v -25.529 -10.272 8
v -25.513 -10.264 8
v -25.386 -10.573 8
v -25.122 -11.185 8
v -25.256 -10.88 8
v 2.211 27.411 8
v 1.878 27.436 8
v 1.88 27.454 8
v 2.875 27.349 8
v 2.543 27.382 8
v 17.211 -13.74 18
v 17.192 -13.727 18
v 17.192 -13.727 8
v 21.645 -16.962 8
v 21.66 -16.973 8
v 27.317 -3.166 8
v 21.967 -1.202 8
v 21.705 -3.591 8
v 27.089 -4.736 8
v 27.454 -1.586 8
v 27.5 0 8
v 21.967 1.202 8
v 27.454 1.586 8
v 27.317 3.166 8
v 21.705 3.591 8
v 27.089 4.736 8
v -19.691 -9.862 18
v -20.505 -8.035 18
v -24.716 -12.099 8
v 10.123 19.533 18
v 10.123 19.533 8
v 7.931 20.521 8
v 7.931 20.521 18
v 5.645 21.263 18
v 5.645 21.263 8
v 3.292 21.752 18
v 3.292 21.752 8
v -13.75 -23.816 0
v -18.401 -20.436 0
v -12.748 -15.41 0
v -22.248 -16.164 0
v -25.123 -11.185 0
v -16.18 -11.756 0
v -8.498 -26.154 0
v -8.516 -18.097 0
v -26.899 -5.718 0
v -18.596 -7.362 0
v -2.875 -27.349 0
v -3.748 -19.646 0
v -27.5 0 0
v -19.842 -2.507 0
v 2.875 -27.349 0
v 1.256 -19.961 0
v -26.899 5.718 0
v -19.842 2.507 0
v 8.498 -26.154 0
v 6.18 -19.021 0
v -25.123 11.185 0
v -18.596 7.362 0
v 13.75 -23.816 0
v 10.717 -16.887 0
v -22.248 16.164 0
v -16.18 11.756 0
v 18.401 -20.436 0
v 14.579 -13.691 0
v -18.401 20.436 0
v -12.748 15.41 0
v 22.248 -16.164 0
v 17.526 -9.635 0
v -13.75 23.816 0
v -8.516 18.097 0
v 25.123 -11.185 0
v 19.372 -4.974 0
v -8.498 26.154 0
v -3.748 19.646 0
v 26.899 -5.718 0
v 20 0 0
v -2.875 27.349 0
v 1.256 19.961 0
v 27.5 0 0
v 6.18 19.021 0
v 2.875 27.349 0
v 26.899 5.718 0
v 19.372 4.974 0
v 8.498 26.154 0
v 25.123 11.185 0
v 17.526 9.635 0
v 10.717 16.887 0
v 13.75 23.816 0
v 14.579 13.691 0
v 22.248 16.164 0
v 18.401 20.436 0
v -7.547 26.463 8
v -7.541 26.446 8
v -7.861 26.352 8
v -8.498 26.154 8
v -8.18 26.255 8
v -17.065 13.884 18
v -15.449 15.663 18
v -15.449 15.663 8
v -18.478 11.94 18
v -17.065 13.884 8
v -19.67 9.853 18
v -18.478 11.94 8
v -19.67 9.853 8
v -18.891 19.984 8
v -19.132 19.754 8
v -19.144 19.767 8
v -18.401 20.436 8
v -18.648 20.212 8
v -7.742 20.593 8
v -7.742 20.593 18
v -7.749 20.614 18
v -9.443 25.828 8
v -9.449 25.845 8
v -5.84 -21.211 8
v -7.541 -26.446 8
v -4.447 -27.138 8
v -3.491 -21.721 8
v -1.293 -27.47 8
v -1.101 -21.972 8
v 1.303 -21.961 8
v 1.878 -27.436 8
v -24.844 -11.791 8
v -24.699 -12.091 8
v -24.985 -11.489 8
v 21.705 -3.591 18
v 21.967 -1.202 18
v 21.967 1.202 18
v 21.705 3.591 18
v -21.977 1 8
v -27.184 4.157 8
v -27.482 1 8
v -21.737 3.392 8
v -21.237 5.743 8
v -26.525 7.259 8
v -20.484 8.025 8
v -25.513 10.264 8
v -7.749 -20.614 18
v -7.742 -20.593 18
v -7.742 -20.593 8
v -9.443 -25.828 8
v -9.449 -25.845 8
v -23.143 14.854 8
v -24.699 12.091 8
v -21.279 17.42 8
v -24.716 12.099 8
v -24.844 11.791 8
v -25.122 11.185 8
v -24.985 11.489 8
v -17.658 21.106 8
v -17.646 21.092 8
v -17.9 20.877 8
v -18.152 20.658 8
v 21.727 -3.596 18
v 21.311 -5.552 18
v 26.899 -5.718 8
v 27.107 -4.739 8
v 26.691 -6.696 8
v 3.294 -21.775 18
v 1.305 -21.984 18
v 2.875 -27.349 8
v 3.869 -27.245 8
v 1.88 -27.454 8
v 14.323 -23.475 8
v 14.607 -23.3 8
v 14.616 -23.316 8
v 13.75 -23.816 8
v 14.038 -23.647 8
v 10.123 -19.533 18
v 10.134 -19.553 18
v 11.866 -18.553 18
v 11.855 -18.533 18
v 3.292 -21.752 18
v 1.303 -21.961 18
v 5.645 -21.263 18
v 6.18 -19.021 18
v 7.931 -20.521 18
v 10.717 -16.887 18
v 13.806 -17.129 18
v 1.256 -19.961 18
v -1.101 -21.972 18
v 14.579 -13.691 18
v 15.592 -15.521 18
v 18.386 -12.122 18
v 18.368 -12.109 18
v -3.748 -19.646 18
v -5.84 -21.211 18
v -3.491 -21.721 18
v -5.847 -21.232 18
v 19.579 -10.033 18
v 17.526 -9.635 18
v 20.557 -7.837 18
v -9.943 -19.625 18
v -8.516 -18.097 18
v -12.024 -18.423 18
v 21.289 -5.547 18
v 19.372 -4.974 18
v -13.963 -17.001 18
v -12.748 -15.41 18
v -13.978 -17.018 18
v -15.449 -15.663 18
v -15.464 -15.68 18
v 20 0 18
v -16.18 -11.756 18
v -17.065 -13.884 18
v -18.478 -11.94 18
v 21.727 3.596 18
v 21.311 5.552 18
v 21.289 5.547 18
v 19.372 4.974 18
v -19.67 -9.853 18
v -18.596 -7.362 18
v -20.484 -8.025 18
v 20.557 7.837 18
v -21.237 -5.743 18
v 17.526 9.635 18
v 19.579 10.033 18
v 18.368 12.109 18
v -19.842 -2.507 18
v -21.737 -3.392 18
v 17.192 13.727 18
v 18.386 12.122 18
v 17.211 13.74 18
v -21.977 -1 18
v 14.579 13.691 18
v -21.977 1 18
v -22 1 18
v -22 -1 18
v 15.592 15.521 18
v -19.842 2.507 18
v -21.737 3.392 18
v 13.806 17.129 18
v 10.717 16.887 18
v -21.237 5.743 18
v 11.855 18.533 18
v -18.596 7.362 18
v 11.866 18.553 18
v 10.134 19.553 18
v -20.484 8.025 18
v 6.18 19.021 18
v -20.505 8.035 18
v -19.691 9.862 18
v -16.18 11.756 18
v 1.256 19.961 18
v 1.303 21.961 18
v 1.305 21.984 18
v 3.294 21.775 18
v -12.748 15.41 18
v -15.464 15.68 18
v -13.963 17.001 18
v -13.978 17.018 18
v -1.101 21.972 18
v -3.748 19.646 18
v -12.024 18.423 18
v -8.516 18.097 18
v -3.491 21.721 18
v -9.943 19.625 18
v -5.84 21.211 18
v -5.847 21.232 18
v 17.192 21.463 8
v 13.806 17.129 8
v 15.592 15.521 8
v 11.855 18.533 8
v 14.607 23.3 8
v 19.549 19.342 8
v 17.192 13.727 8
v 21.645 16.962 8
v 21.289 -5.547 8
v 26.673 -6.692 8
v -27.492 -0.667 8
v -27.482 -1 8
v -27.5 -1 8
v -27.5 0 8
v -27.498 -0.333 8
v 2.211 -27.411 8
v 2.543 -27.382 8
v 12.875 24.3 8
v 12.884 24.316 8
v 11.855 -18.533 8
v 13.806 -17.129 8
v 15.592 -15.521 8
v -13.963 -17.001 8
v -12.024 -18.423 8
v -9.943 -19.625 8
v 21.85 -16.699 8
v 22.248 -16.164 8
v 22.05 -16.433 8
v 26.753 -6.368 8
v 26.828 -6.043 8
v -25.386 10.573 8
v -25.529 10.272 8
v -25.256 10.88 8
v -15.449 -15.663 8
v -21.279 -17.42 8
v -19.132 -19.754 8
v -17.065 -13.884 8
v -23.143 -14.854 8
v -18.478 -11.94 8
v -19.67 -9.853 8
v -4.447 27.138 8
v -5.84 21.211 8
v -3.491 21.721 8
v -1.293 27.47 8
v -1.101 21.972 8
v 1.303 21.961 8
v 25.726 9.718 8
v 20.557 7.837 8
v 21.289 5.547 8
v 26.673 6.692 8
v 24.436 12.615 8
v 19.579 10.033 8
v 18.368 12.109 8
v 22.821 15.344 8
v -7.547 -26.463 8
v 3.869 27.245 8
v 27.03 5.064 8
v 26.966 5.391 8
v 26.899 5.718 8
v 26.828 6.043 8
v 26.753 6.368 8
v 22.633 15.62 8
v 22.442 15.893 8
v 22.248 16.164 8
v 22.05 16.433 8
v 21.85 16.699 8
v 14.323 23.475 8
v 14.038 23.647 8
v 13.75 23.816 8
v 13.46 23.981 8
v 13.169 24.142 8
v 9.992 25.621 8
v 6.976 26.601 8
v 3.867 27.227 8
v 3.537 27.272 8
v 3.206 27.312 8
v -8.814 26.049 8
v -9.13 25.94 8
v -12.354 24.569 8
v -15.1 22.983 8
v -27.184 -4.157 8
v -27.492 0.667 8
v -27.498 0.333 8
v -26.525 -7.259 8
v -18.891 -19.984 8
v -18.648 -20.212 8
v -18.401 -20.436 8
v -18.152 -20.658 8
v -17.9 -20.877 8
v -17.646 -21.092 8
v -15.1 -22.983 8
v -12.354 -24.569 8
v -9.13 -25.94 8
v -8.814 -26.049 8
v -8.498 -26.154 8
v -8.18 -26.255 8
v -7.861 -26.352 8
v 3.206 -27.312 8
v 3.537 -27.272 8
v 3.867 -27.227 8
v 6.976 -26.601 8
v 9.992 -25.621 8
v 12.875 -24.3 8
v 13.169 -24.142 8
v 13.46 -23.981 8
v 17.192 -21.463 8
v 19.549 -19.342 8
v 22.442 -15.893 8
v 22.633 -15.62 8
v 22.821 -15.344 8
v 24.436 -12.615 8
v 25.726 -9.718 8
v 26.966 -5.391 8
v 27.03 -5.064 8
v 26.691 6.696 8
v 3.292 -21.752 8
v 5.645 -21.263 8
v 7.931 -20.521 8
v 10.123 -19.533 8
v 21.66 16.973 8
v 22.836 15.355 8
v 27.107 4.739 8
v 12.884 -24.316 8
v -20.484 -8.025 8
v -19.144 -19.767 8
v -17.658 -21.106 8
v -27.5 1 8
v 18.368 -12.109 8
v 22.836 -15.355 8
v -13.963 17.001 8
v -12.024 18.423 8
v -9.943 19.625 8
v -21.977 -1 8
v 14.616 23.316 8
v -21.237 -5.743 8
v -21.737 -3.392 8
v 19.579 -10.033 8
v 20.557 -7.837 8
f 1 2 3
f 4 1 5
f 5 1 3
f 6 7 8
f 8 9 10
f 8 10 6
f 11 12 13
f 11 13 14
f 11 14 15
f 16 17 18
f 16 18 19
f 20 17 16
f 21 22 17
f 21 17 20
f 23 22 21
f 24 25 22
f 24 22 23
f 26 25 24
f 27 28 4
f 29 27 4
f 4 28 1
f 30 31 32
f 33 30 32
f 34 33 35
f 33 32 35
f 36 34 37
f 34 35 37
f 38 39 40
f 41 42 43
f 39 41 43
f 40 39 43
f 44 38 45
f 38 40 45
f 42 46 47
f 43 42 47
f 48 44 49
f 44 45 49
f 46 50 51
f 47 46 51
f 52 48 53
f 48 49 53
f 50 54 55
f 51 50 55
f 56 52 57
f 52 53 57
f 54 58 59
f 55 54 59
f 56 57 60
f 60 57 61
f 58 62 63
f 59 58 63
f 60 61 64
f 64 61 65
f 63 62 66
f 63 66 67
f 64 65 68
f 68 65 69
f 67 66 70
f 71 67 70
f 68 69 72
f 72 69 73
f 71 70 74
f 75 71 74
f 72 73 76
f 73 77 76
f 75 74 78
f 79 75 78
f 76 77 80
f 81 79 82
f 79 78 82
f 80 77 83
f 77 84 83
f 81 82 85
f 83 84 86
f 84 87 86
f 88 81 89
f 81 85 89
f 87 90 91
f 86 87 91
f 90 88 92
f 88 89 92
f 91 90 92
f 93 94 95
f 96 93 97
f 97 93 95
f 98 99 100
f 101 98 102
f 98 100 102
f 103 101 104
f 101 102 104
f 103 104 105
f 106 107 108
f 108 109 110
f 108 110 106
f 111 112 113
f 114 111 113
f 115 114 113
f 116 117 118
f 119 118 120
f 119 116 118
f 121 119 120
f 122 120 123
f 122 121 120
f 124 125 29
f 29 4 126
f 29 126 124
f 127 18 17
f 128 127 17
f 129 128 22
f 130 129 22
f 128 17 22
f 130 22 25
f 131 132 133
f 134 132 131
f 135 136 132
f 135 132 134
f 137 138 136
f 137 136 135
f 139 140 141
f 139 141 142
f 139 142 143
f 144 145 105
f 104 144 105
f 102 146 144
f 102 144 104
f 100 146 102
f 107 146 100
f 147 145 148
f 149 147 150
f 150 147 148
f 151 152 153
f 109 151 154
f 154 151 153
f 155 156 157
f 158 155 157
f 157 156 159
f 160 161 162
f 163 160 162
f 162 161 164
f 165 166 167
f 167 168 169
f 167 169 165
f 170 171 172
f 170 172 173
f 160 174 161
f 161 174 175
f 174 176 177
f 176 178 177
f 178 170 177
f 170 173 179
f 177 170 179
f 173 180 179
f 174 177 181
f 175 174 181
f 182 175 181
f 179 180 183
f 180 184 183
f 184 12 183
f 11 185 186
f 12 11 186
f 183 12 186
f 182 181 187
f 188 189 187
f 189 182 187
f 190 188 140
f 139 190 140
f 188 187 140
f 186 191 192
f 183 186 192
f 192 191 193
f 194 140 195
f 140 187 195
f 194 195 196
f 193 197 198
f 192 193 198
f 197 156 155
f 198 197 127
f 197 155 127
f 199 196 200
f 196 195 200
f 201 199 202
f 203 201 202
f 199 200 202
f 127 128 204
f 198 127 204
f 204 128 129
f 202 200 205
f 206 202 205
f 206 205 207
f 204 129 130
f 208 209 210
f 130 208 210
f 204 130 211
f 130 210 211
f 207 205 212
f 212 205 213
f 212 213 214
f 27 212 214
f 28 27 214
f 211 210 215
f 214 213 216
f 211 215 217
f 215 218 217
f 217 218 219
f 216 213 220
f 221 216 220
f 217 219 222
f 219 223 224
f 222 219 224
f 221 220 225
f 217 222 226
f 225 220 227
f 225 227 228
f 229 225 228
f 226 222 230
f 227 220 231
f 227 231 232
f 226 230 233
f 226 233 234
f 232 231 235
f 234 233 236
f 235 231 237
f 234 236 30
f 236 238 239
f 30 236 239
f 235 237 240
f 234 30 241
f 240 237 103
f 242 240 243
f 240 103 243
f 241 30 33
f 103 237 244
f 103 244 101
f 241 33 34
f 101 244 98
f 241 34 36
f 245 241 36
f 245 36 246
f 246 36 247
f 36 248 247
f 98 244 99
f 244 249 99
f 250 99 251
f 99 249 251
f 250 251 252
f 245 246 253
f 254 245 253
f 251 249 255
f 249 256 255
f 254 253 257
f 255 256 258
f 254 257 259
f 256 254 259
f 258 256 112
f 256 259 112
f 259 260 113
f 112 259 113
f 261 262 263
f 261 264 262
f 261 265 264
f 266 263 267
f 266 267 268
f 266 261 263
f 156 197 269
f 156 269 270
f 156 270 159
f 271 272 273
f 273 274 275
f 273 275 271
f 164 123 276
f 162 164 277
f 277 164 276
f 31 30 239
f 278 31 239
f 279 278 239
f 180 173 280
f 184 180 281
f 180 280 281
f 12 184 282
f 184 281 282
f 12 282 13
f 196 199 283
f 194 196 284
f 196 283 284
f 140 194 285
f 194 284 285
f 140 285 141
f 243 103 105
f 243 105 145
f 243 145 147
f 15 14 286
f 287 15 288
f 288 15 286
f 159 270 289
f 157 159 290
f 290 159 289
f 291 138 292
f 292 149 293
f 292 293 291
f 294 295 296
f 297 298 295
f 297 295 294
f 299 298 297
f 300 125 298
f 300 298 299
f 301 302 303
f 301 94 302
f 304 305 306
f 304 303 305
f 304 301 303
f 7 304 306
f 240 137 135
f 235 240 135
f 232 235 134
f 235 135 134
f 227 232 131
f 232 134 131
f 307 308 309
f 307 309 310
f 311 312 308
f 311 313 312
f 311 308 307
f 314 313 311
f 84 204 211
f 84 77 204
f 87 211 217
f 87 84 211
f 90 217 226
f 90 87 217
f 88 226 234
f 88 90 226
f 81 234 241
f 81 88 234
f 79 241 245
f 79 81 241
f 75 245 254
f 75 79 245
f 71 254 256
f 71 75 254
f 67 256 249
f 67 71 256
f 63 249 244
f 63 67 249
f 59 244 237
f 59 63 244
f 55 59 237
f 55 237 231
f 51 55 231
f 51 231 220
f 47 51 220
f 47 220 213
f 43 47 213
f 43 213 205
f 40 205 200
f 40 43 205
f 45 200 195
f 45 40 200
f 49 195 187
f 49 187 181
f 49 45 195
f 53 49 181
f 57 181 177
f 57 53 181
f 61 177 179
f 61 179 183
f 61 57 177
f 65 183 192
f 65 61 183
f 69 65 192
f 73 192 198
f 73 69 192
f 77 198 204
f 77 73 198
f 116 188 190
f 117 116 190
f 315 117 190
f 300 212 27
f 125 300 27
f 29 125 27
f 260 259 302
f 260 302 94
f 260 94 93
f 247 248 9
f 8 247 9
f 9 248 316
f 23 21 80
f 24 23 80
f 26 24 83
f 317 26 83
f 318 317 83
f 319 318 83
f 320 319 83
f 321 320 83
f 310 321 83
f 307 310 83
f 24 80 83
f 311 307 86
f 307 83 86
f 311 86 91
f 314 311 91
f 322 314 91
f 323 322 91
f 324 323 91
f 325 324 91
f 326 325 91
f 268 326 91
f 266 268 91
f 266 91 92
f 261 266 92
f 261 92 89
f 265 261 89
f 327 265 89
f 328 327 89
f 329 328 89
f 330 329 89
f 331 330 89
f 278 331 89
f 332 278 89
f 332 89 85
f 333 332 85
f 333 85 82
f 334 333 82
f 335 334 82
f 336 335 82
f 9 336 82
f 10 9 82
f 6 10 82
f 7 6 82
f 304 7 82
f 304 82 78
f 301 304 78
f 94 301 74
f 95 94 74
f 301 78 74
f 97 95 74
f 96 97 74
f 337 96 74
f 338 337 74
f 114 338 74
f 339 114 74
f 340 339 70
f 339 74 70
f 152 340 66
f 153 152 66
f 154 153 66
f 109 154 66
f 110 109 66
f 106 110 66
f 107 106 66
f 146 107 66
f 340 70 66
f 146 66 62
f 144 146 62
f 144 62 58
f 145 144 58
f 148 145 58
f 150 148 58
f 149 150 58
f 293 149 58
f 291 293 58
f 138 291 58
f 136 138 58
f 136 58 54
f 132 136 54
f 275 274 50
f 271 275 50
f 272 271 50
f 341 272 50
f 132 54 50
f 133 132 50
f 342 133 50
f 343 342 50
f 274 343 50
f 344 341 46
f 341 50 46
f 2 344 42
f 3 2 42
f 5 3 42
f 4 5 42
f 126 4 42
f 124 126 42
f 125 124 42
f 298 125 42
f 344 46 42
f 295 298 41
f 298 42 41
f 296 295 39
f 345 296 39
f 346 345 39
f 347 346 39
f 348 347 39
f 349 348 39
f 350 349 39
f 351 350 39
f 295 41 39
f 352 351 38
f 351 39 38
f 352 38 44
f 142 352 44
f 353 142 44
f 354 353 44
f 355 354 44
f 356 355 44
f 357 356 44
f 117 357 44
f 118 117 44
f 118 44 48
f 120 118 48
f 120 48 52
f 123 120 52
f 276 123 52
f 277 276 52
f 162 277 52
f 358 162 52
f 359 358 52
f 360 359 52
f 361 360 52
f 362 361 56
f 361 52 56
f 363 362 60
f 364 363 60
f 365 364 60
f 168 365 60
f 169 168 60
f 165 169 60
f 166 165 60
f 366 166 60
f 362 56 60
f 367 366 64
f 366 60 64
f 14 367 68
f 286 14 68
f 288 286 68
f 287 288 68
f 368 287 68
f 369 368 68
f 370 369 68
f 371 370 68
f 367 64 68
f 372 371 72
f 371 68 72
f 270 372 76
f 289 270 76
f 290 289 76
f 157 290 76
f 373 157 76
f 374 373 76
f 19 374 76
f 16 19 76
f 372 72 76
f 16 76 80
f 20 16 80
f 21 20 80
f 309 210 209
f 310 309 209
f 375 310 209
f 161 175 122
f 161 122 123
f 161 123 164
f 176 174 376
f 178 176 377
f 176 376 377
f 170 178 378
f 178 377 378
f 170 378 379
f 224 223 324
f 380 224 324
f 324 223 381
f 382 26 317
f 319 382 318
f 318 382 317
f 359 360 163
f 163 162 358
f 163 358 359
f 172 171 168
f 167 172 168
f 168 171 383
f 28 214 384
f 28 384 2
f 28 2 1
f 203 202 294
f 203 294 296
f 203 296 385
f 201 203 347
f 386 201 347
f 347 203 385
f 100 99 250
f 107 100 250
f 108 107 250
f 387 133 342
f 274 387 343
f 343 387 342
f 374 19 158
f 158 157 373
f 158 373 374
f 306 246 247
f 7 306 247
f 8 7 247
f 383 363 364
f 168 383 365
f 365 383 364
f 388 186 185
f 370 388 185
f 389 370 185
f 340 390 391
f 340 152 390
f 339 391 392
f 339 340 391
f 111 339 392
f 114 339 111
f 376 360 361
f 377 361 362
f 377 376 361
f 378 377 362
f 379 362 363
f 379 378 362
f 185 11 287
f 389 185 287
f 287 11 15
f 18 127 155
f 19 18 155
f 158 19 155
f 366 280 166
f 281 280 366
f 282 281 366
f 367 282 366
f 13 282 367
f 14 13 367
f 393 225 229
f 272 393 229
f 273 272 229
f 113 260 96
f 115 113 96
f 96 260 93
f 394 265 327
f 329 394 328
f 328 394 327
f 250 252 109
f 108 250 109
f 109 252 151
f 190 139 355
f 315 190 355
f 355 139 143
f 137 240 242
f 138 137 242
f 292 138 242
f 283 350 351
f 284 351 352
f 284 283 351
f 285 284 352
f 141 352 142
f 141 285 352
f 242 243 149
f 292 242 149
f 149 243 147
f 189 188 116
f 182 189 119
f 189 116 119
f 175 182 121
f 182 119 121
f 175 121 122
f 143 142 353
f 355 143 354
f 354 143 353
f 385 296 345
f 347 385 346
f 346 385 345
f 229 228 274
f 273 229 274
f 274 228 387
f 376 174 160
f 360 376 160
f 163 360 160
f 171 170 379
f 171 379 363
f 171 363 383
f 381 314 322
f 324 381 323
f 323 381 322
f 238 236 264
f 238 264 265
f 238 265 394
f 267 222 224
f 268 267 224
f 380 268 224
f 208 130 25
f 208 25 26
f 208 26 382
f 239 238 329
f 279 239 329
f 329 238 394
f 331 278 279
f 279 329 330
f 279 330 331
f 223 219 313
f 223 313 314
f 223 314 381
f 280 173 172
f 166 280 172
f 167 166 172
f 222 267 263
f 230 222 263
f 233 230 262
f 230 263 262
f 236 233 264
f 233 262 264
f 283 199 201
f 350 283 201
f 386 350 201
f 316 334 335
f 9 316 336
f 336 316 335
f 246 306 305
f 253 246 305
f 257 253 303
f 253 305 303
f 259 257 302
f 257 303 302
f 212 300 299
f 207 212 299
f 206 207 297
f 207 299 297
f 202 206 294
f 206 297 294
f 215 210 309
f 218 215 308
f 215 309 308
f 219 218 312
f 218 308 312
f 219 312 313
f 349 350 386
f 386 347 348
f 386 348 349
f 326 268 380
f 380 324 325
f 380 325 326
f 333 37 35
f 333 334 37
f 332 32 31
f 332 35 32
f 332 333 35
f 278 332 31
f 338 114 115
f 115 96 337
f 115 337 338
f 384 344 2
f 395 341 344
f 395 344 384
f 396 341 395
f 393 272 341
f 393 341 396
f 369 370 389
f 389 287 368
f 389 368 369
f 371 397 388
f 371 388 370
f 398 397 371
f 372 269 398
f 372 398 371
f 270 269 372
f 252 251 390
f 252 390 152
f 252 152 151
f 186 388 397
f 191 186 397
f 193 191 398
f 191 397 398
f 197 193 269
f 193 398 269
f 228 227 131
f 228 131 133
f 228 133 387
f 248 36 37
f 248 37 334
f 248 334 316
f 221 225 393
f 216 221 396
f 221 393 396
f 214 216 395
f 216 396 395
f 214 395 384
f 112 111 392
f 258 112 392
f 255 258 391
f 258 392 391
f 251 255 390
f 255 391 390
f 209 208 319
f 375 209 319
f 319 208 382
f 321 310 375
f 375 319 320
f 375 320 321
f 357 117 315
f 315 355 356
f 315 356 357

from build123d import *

# Parameters (mm, degrees)
SKETCH1_R           = 27.5
SKETCH1_R_2         = 20
BOSS_EXTRUDE1_DEPTH = 8
SKETCH2_R           = 22
SKETCH2_R_2         = 20
BOSS_EXTRUDE2_DEPTH = 10
BOSS_EXTRUDE3_DEPTH = 1
CIRPATTERN1_COUNT   = 15


with BuildPart() as part:
    # Sketch1 → Boss-Extrude1 (new body)
    with BuildSketch(Plane.XY):
        Circle(SKETCH1_R)
        Circle(SKETCH1_R_2, mode=Mode.SUBTRACT)
    extrude(amount=BOSS_EXTRUDE1_DEPTH)

    # Sketch2 → Boss-Extrude2 (add)
    with BuildSketch(Plane.XY.offset(8)):
        Circle(SKETCH2_R)
        Circle(SKETCH2_R_2, mode=Mode.SUBTRACT)
    extrude(amount=BOSS_EXTRUDE2_DEPTH)

    # Sketch3 → Boss-Extrude3 (add, symmetric)
    with BuildSketch(Plane(origin=(0, 0, 0), x_dir=(1, 0, 0), z_dir=(0, 1, 0))):
        Polygon((-22, -18), (-27.5, -8), (-22, -8), (-20.5, -8), (-20.5, -18), align=None)
    boss_extrude3 = extrude(amount=BOSS_EXTRUDE3_DEPTH, both=True)

    # CirPattern1: Boss-Extrude3 ×15 about axis
    cirpattern1_axis = Axis((0, 0, 0), (0, 0, 1))
    for i in range(1, CIRPATTERN1_COUNT):
        add(boss_extrude3.rotate(cirpattern1_axis, i * 360 / CIRPATTERN1_COUNT))


solid = part.part
